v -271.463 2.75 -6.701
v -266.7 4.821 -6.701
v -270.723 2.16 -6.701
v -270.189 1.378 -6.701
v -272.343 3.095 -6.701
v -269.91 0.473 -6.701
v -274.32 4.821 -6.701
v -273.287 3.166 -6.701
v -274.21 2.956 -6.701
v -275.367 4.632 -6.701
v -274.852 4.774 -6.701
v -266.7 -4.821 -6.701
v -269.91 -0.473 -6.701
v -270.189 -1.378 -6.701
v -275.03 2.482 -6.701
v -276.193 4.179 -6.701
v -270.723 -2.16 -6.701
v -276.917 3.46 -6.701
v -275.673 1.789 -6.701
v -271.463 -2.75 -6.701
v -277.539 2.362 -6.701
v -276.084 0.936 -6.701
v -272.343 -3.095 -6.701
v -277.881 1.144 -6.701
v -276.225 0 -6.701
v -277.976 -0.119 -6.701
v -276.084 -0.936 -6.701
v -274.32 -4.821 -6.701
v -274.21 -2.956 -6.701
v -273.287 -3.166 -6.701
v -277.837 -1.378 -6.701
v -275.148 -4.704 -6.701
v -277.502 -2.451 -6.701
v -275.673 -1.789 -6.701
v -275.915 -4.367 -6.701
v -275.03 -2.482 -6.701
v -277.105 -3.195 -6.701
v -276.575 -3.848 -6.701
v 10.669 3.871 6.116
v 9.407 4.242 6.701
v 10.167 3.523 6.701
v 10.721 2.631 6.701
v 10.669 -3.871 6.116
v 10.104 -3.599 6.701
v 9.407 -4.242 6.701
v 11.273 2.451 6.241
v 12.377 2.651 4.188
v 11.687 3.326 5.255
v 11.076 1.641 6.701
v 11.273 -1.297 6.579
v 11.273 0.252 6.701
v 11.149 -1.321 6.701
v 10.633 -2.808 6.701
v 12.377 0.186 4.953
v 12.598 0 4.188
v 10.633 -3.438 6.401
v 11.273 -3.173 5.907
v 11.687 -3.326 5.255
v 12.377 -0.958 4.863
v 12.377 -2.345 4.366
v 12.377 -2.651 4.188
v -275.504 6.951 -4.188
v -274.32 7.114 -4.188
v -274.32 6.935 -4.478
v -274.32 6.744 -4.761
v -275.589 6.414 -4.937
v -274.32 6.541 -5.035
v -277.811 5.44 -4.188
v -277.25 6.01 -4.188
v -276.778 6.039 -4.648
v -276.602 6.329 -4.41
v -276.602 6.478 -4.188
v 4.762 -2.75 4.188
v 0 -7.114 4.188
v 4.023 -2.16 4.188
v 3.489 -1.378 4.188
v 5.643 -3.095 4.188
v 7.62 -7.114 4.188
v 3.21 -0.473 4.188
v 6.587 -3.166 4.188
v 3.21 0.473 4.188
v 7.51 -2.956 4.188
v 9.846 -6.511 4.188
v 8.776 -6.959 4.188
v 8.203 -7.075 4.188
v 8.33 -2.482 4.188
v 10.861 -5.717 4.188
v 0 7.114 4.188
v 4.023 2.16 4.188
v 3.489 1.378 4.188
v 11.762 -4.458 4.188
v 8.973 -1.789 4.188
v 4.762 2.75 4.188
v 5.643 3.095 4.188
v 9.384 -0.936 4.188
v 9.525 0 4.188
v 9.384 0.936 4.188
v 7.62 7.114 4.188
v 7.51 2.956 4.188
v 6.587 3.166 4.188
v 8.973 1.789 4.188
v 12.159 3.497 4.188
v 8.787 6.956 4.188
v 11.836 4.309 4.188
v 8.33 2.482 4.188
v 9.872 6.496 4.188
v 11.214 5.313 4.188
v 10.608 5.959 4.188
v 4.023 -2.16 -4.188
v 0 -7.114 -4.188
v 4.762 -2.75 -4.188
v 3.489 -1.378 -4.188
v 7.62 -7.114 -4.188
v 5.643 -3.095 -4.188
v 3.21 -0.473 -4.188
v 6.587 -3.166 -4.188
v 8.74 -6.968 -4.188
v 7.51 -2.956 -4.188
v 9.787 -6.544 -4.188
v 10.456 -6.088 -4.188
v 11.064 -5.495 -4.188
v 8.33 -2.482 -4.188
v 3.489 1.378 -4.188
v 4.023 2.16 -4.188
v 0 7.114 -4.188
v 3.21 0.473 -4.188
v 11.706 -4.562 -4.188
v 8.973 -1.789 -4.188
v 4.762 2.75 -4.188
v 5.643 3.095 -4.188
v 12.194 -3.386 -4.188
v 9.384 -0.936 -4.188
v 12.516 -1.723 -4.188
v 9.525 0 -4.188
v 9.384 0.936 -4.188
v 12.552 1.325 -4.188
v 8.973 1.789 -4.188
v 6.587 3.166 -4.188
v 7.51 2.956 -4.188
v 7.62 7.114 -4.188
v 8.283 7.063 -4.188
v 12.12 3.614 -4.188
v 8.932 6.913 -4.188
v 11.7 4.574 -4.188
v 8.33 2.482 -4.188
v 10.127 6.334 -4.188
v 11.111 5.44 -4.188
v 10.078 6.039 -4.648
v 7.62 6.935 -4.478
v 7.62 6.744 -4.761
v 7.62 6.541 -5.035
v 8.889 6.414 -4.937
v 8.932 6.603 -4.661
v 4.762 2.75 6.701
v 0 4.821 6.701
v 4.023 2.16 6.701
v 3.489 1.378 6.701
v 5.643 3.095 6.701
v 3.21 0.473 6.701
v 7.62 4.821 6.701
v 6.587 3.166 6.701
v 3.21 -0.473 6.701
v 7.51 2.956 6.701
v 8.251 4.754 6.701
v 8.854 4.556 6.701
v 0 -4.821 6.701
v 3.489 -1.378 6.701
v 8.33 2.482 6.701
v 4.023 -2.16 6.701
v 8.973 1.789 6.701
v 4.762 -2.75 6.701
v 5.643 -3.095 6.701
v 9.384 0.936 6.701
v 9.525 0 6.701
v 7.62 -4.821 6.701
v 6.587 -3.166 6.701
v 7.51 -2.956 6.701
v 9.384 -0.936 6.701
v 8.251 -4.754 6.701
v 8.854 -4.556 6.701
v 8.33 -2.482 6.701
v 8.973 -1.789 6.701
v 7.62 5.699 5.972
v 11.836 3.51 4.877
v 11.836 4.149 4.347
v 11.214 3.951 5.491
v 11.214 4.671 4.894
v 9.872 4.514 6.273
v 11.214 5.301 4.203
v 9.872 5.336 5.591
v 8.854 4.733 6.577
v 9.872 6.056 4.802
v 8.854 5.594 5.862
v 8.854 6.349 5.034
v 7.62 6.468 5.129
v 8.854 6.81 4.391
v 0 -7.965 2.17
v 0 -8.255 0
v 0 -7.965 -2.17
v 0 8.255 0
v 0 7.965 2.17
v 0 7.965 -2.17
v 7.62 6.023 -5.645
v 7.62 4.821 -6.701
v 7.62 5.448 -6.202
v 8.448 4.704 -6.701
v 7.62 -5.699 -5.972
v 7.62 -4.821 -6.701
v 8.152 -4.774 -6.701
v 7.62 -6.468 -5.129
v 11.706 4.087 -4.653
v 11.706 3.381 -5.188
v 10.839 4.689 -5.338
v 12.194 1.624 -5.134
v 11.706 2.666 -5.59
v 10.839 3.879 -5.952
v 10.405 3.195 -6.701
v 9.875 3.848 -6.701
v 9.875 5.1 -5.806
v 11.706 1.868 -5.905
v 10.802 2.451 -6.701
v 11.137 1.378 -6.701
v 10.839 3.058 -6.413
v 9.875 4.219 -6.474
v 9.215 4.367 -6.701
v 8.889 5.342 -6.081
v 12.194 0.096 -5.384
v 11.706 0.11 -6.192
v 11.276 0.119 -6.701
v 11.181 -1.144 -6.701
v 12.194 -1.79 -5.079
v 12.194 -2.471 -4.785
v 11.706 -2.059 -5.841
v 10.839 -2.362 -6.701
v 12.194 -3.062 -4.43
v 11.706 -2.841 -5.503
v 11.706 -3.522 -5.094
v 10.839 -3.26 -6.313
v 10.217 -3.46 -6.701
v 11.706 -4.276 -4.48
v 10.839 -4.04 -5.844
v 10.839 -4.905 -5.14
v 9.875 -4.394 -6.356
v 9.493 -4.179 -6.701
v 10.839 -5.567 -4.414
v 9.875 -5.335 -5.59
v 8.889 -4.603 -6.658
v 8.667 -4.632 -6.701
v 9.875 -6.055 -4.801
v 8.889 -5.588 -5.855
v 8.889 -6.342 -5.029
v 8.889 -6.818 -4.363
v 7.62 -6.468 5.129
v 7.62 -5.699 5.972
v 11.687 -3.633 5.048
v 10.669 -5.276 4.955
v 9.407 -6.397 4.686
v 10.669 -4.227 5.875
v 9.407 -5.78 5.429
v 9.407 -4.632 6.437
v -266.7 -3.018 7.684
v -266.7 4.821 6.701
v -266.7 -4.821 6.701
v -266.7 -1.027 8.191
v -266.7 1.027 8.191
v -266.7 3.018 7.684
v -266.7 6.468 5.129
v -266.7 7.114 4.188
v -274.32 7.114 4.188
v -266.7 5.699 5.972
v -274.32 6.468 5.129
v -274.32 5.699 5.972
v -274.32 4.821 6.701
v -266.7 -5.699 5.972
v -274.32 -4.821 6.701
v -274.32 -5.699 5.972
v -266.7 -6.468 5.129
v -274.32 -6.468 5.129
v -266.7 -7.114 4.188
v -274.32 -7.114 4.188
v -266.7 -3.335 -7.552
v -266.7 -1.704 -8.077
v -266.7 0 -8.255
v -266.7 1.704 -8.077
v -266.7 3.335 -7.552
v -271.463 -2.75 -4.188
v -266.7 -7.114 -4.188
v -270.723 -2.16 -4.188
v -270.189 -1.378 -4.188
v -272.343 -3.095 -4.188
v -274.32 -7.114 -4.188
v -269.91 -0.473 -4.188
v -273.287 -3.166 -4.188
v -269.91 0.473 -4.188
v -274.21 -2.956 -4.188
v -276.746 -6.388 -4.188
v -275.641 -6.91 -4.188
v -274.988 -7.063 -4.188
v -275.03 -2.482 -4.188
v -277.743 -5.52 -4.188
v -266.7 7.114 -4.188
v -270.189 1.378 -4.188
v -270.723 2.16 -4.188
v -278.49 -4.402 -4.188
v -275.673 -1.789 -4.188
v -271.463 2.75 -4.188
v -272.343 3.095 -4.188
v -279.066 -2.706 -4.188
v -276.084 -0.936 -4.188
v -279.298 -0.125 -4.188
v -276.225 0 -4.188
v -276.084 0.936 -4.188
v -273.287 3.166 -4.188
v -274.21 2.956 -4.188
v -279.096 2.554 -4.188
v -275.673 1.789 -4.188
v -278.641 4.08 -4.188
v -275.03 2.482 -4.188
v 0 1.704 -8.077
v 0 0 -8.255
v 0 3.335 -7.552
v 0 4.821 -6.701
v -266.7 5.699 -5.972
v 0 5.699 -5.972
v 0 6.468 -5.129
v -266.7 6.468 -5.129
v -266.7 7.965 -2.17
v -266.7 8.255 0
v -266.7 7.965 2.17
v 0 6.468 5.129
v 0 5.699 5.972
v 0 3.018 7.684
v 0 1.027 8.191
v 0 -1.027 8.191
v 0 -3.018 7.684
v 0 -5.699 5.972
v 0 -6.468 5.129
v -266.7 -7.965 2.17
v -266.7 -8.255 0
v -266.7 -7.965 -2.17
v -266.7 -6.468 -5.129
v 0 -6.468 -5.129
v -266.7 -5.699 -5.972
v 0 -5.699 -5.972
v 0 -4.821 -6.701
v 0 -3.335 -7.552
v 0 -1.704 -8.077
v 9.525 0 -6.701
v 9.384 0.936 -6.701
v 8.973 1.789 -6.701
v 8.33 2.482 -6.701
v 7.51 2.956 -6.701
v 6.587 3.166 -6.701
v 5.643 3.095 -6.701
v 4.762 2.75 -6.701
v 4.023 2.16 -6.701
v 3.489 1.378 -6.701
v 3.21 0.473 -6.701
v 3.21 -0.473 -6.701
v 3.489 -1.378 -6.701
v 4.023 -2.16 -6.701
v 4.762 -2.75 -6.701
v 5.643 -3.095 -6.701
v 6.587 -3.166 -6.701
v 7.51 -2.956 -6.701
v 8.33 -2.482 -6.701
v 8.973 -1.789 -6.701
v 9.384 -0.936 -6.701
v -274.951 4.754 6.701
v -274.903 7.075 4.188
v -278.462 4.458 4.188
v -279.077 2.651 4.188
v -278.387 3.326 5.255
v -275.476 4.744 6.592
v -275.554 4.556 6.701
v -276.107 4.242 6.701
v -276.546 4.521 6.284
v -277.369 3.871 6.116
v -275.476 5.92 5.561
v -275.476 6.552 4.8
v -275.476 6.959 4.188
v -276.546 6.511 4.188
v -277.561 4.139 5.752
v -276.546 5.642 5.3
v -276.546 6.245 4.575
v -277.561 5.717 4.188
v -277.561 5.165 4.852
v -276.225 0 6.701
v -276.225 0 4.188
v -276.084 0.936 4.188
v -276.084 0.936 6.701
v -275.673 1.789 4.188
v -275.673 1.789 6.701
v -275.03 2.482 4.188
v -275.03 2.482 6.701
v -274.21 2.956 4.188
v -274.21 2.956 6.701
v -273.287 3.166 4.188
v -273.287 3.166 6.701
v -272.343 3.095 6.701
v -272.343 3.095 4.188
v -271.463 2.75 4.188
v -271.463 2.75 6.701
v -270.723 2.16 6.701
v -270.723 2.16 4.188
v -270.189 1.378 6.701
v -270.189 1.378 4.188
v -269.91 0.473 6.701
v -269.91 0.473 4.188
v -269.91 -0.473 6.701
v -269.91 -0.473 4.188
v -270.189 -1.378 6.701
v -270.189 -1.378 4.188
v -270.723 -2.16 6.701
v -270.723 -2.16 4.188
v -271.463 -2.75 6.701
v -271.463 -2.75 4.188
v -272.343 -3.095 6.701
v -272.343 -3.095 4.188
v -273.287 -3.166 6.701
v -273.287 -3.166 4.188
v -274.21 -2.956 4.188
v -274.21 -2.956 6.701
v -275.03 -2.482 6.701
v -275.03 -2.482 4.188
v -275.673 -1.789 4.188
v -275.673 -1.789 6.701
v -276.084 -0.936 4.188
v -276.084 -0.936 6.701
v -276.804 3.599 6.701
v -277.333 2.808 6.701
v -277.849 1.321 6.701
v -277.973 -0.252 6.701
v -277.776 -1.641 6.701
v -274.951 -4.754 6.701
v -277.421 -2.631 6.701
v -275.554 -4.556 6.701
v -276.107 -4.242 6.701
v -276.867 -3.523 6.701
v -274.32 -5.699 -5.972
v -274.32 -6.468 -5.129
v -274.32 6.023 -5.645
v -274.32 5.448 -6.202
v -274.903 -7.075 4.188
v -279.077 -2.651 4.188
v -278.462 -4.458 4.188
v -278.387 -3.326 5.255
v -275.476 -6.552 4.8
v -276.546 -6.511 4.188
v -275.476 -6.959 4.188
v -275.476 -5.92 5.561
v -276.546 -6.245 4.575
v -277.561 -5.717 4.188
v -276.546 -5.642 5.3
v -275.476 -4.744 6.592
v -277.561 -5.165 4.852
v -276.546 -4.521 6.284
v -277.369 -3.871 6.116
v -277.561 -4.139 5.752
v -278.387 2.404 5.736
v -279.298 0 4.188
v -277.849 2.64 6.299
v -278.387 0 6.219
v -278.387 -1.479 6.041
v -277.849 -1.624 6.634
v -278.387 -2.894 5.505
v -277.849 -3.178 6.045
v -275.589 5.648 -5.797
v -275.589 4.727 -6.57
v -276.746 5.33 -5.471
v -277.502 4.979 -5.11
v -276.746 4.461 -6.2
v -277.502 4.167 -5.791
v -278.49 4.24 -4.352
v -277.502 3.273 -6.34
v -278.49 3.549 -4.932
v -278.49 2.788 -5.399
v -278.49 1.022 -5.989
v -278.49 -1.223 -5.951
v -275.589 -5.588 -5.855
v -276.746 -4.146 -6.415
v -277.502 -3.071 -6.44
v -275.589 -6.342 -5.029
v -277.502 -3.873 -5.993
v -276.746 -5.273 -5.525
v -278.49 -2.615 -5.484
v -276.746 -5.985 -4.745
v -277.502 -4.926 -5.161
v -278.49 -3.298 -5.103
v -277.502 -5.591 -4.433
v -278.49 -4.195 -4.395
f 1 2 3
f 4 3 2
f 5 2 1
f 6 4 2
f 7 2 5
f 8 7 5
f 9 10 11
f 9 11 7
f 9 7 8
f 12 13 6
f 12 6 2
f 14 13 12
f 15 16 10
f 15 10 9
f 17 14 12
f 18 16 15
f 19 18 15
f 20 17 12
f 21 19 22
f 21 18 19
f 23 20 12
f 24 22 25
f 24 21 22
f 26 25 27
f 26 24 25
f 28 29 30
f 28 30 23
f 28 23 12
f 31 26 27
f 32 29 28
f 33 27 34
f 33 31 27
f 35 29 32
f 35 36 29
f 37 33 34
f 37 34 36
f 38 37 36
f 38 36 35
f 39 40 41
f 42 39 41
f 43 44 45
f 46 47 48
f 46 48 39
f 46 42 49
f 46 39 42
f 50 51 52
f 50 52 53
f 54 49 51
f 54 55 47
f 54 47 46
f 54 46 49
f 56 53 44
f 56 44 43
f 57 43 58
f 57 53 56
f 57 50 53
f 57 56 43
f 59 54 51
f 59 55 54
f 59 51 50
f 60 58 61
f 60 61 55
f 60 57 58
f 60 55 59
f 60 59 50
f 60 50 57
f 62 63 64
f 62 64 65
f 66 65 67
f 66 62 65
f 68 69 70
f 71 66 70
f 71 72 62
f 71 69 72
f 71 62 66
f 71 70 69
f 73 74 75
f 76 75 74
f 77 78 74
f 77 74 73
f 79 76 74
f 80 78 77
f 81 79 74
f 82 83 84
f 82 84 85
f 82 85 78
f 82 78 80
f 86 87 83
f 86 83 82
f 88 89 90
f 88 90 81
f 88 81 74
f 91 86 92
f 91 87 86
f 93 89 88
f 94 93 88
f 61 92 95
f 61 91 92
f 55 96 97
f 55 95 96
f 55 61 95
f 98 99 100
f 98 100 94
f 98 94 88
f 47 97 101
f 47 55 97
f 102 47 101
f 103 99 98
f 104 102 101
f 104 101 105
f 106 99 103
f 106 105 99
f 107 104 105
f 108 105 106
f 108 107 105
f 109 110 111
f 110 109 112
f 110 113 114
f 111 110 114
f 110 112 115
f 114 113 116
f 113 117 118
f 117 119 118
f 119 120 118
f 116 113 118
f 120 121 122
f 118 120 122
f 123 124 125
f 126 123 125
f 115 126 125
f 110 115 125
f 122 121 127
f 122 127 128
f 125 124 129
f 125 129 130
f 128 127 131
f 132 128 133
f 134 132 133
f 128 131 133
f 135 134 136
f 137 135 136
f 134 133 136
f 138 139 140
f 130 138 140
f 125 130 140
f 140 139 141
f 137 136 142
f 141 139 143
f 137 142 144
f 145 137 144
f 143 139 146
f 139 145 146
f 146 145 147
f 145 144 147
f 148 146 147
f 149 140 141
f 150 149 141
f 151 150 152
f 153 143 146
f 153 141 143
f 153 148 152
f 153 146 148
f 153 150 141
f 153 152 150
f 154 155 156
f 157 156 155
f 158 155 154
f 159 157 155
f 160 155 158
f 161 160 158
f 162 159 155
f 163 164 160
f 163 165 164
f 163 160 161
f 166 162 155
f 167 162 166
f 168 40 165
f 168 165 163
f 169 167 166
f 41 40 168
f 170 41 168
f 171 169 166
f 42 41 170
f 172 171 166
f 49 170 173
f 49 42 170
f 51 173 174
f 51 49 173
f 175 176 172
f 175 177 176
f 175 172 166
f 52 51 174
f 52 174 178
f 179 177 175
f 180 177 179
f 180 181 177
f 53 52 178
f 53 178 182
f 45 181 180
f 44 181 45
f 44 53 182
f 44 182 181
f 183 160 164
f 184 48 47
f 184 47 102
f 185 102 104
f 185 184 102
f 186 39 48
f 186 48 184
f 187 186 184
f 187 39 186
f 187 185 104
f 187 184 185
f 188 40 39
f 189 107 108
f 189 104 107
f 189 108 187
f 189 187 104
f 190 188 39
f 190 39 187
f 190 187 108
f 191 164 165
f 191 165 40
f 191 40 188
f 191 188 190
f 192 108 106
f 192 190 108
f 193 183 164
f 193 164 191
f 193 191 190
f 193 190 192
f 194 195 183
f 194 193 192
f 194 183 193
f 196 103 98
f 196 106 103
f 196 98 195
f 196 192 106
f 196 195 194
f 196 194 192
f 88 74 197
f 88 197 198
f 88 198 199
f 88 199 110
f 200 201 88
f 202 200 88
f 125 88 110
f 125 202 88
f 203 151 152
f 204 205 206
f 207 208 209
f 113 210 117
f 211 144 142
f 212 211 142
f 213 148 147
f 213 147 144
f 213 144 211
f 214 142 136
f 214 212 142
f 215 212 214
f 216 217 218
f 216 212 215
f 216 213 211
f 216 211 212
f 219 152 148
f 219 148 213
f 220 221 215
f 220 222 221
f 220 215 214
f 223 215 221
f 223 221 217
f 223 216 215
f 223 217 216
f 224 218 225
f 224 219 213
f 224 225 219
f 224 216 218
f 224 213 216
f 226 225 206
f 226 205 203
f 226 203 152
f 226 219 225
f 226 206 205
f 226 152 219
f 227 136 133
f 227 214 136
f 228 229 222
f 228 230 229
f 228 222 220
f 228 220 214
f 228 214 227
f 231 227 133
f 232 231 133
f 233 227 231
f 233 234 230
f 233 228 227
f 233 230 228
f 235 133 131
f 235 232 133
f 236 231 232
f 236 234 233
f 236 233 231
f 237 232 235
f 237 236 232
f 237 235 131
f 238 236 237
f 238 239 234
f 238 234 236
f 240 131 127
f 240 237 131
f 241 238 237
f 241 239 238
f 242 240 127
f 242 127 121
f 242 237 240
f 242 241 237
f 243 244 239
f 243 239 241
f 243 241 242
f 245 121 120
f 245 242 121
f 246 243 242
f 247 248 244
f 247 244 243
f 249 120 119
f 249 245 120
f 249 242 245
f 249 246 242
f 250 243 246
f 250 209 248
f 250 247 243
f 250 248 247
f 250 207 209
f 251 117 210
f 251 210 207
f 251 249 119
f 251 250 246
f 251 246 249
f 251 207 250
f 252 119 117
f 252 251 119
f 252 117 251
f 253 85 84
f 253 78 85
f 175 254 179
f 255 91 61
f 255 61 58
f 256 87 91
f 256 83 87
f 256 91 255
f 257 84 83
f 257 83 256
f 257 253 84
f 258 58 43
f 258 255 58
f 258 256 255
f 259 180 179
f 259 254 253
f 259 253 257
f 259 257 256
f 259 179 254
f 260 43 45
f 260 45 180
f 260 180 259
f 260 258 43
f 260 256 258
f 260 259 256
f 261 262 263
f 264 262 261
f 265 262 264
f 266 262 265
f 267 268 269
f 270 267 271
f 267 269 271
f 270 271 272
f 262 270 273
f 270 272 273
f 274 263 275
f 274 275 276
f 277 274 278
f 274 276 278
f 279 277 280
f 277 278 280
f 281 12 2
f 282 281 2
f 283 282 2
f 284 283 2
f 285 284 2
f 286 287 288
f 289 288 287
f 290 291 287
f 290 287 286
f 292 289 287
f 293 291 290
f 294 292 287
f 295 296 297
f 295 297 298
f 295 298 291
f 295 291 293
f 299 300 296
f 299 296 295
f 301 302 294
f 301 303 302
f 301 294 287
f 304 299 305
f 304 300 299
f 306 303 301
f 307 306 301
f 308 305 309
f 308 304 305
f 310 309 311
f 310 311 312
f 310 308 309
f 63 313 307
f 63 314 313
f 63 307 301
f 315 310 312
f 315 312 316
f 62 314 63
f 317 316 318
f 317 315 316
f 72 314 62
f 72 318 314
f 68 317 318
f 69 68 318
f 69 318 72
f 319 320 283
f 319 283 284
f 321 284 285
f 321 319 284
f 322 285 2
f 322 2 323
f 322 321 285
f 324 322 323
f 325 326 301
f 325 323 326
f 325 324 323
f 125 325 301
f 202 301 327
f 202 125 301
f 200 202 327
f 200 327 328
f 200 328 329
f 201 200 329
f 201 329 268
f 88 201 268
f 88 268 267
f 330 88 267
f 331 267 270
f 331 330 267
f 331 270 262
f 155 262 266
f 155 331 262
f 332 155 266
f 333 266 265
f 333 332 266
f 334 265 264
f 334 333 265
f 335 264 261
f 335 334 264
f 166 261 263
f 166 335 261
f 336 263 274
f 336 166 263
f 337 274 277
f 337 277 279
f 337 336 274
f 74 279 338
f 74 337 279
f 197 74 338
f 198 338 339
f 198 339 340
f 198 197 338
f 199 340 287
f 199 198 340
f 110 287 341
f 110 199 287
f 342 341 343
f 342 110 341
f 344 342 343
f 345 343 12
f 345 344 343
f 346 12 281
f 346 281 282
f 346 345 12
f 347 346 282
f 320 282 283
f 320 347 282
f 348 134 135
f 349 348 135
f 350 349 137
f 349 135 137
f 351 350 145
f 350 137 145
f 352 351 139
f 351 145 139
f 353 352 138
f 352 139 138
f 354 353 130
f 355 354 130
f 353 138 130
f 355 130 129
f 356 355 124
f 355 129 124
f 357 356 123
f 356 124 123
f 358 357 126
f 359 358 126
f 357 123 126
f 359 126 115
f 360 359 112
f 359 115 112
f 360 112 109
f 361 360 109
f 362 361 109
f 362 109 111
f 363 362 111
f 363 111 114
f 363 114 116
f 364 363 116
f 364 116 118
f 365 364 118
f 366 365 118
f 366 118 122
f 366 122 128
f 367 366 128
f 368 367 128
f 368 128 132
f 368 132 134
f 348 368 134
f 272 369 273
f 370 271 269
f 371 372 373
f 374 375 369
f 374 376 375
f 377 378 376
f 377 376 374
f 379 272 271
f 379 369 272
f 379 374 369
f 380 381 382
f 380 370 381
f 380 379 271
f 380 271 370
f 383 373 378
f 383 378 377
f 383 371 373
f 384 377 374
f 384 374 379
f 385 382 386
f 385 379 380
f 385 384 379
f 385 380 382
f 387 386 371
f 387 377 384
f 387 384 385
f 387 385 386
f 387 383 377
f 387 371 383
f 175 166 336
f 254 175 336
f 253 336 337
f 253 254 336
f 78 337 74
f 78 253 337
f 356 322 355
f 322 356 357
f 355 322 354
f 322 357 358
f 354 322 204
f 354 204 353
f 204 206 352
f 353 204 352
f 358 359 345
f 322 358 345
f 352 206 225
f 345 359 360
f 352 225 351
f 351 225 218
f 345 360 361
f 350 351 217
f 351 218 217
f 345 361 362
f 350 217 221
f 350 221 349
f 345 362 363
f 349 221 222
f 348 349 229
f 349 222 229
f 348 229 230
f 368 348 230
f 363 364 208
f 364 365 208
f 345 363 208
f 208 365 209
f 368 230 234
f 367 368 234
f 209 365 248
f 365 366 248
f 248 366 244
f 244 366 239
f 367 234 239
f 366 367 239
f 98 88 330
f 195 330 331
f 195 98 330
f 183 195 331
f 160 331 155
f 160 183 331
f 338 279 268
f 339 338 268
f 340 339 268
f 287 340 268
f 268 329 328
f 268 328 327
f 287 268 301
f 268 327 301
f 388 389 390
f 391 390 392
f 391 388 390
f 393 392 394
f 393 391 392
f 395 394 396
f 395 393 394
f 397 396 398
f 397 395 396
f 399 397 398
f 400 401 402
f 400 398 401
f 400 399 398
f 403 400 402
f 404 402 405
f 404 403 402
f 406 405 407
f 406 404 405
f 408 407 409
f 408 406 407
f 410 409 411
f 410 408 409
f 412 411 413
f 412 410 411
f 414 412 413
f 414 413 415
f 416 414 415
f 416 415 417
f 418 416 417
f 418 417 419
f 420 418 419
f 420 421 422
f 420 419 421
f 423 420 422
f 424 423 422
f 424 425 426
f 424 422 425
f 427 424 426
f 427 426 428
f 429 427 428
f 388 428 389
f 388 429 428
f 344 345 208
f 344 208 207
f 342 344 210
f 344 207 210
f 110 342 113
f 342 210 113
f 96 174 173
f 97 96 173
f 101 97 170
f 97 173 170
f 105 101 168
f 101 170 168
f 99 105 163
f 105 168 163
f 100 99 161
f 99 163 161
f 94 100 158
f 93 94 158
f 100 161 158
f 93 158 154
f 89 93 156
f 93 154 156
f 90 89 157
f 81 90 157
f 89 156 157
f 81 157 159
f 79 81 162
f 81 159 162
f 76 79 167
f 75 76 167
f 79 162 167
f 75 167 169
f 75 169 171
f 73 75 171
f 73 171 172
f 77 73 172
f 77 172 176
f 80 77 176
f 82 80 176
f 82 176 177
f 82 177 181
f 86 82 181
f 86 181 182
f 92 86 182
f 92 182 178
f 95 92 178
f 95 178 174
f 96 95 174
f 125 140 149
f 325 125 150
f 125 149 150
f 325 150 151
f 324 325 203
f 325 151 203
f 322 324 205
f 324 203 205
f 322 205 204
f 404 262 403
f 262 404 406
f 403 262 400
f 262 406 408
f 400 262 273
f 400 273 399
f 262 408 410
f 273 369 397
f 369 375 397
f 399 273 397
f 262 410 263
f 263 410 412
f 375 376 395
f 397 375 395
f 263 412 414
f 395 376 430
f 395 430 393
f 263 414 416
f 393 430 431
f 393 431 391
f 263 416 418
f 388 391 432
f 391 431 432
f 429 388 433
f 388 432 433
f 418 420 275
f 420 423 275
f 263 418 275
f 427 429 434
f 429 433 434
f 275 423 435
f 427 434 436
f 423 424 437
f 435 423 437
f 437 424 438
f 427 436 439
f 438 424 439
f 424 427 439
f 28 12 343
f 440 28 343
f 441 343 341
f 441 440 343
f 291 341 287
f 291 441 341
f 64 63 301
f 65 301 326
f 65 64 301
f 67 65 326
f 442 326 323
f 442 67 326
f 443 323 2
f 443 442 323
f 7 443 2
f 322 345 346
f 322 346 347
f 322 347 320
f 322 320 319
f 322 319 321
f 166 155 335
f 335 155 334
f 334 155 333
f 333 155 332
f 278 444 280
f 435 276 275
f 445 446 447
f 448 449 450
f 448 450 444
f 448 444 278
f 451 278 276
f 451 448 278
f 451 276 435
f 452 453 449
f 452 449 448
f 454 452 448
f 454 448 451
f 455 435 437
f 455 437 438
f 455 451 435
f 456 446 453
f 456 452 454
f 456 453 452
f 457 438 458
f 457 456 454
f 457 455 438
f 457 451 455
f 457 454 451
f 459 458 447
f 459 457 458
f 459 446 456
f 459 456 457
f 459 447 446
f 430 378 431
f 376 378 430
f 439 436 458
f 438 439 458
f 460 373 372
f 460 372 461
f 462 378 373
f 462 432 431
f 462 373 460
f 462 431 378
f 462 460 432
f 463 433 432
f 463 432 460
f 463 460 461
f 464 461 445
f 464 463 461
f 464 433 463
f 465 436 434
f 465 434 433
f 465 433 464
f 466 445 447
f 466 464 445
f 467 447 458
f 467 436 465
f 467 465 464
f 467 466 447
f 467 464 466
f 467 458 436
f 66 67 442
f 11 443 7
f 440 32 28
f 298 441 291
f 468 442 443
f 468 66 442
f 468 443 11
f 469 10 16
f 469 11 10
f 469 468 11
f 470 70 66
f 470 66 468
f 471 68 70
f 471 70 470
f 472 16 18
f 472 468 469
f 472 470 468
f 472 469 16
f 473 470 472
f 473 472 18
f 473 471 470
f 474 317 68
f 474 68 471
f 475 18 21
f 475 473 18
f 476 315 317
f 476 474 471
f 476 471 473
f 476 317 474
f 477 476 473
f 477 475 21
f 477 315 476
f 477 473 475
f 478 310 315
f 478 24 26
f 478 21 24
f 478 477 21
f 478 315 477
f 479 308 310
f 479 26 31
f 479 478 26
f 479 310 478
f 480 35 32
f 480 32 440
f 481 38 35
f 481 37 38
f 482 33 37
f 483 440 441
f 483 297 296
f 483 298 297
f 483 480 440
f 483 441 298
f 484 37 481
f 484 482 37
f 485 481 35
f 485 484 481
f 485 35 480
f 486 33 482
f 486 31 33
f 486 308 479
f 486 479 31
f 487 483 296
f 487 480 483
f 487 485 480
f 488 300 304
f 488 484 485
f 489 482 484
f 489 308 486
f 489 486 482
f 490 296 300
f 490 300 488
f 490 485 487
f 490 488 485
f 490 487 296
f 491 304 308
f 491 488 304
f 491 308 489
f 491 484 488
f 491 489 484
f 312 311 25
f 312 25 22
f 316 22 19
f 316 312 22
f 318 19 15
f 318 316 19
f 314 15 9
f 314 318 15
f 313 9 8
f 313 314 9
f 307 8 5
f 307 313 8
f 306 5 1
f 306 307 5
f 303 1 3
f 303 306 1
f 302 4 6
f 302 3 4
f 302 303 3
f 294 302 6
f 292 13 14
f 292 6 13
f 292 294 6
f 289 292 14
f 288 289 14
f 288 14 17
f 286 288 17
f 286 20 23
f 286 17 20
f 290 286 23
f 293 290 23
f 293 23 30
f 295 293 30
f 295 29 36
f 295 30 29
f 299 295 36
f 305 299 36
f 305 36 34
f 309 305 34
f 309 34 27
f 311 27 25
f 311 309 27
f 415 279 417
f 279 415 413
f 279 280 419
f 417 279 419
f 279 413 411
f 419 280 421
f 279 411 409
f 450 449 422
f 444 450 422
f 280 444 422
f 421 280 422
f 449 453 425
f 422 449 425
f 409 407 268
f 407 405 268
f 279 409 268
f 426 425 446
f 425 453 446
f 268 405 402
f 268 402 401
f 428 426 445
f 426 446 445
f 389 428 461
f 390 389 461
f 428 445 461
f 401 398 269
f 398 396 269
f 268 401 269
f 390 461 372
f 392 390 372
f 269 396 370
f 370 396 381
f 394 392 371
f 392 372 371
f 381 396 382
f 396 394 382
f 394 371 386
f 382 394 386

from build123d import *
from build123d.topology import SkipClean

# Parameters (mm, degrees)
SKETCH1_R            = 8.255
BOSS_EXTRUDE1_DEPTH  = 266.7
BOSS_EXTRUDE2_START  = 12.7
BOSS_EXTRUDE2_DEPTH  = 12.7
SKETCH5_R            = 3.175
CUT_EXTRUDE1_DEPTH   = 268.246525418
FILLET2_R            = 5.08
FILLET2_OF_MIRROR1_R = 5.08


with BuildPart() as part:
    # Sketch1 → Boss-Extrude1 (new body)
    with BuildSketch(Plane.YZ):
        with Locations(Location((0, 0, 0), (0, 0, 270))):
            Circle(SKETCH1_R)
    boss_extrude1 = extrude(amount=-BOSS_EXTRUDE1_DEPTH)

    # Sketch4 → Boss-Extrude2 (add)
    with SkipClean():  # the faces are left unmerged after this step: merging them gives an invalid solid
        with BuildSketch(Plane.YZ.offset(BOSS_EXTRUDE2_START)):
            with BuildLine():
                Line((-7.113903851, -4.187767543), (7.113903851, -4.187767543))
                ThreePointArc((7.113903851, -4.187767543), (6.098527778, -5.563540594), (4.821496361, -6.700611751))
                Line((4.821496361, -6.700611751), (-4.821496361, -6.700611751))
                ThreePointArc((-4.821496361, -6.700611751), (-6.098527778, -5.563540594), (-7.113903851, -4.187767543))
            make_face()
            with BuildLine():
                Line((-7.113903851, 4.187767543), (7.113903851, 4.187767543))
                ThreePointArc((7.113903851, 4.187767543), (6.098527778, 5.563540594), (4.821496361, 6.700611751))
                Line((4.821496361, 6.700611751), (-4.821496361, 6.700611751))
                ThreePointArc((-4.821496361, 6.700611751), (-6.098527778, 5.563540594), (-7.113903851, 4.187767543))
            make_face()
        boss_extrude2 = extrude(amount=-BOSS_EXTRUDE2_DEPTH)

    # Sketch5 → Cut-Extrude1 (cut, through all)
    with SkipClean():  # the faces are left unmerged after this step: merging them gives an invalid solid
        with BuildSketch(Plane.XY.offset(6.700611751)):
            with Locations((6.35, 0)):
                Circle(SKETCH5_R)
        cut_extrude1 = extrude(amount=-CUT_EXTRUDE1_DEPTH, mode=Mode.SUBTRACT)

    # Fillet2
    # the kernel refuses this fillet: 5.08 mm, written as the material it takes off along each edge
    with BuildSketch(Plane(origin=(12.7, 0, 0), x_dir=(0, 0.7924229506159141, -0.6099720217658908), z_dir=(0, 0.6099720217658908, 0.7924229506159141))) as fillet2_piece_1:
        with BuildLine():
            CenterArc((8.255 - FILLET2_R, FILLET2_R), FILLET2_R, 270, 90)
            Line((8.255 - FILLET2_R, 0), (8.255, 0))
            Line((8.255, 0), (8.255, FILLET2_R))
        make_face()
    revolve(axis=Axis((12.7, 0, 0), (-1, 0, 0)), revolution_arc=200.07814468, mode=Mode.SUBTRACT)
    with BuildSketch(Plane(origin=(12.7, 0, 0), x_dir=(0, 0.534859378845264, 0.8449410895803674), z_dir=(0, -0.8449410895803674, 0.534859378845264))) as fillet2_piece_2:
        with BuildLine():
            CenterArc((8.255 - FILLET2_R, FILLET2_R), FILLET2_R, 270, 90)
            Line((8.255 - FILLET2_R, 0), (8.255, 0))
            Line((8.255, 0), (8.255, FILLET2_R))
        make_face()
    revolve(axis=Axis((12.7, 0, 0), (-1, 0, 0)), revolution_arc=200.07814468, mode=Mode.SUBTRACT)
    with BuildSketch(Plane(origin=(12.7, 0, 0), x_dir=(0, 0.7924229506159125, 0.6099720217658933), z_dir=(0, 0.6099720217658933, -0.7924229506159125))) as fillet2_piece_3:
        with BuildLine():
            CenterArc((8.255 - FILLET2_R, -FILLET2_R), FILLET2_R, 0, 90)
            Line((8.255 - FILLET2_R, 0), (8.255, 0))
            Line((8.255, 0), (8.255, -FILLET2_R))
        make_face()
    revolve(axis=Axis((12.7, 0, 0), (1, 0, 0)), revolution_arc=200.07814468, mode=Mode.SUBTRACT)
    with BuildSketch(Plane(origin=(12.7, 0, 0), x_dir=(0, 0.534859378845264, -0.8449410895803674), z_dir=(0, -0.8449410895803674, -0.534859378845264))) as fillet2_piece_4:
        with BuildLine():
            CenterArc((8.255 - FILLET2_R, -FILLET2_R), FILLET2_R, 0, 90)
            Line((8.255 - FILLET2_R, 0), (8.255, 0))
            Line((8.255, 0), (8.255, -FILLET2_R))
        make_face()
    revolve(axis=Axis((12.7, 0, 0), (1, 0, 0)), revolution_arc=200.07814468, mode=Mode.SUBTRACT)

    # Mirror1: Boss-Extrude1, Boss-Extrude2, Cut-Extrude1 across plane
    add(boss_extrude1.mirror(Plane(origin=(-133.35, 0, 0), x_dir=(0, 0, 1), z_dir=(1, 0, 0))))
    add(boss_extrude2.mirror(Plane(origin=(-133.35, 0, 0), x_dir=(0, 0, 1), z_dir=(1, 0, 0))))
    add(cut_extrude1.mirror(Plane(origin=(-133.35, 0, 0), x_dir=(0, 0, 1), z_dir=(1, 0, 0))), mode=Mode.SUBTRACT)

    # Fillet2 of Mirror1
    # the kernel refuses this fillet: 5.08 mm, written as the material it takes off along each edge
    with BuildSketch(Plane(origin=(-279.4, 0, 0), x_dir=(0, 0.7924229506159141, -0.6099720217658908), z_dir=(0, 0.6099720217658908, 0.7924229506159141))) as fillet2_of_mirror1_piece_1:
        with BuildLine():
            CenterArc((8.255 - FILLET2_OF_MIRROR1_R, -FILLET2_OF_MIRROR1_R), FILLET2_OF_MIRROR1_R, 0, 90)
            Line((8.255 - FILLET2_OF_MIRROR1_R, 0), (8.255, 0))
            Line((8.255, 0), (8.255, -FILLET2_OF_MIRROR1_R))
        make_face()
    revolve(axis=Axis((-279.4, 0, 0), (-1, 0, 0)), revolution_arc=200.07814468, mode=Mode.SUBTRACT)
    with BuildSketch(Plane(origin=(-279.4, 0, 0), x_dir=(0, 0.534859378845264, 0.8449410895803674), z_dir=(0, -0.8449410895803674, 0.534859378845264))) as fillet2_of_mirror1_piece_2:
        with BuildLine():
            CenterArc((8.255 - FILLET2_OF_MIRROR1_R, -FILLET2_OF_MIRROR1_R), FILLET2_OF_MIRROR1_R, 0, 90)
            Line((8.255 - FILLET2_OF_MIRROR1_R, 0), (8.255, 0))
            Line((8.255, 0), (8.255, -FILLET2_OF_MIRROR1_R))
        make_face()
    revolve(axis=Axis((-279.4, 0, 0), (-1, 0, 0)), revolution_arc=200.07814468, mode=Mode.SUBTRACT)
    with BuildSketch(Plane(origin=(-279.4, 0, 0), x_dir=(0, 0.7924229506159125, 0.6099720217658933), z_dir=(0, 0.6099720217658933, -0.7924229506159125))) as fillet2_of_mirror1_piece_3:
        with BuildLine():
            CenterArc((8.255 - FILLET2_OF_MIRROR1_R, FILLET2_OF_MIRROR1_R), FILLET2_OF_MIRROR1_R, 270, 90)
            Line((8.255 - FILLET2_OF_MIRROR1_R, 0), (8.255, 0))
            Line((8.255, 0), (8.255, FILLET2_OF_MIRROR1_R))
        make_face()
    revolve(axis=Axis((-279.4, 0, 0), (1, 0, 0)), revolution_arc=200.07814468, mode=Mode.SUBTRACT)
    with BuildSketch(Plane(origin=(-279.4, 0, 0), x_dir=(0, 0.534859378845264, -0.8449410895803674), z_dir=(0, -0.8449410895803674, -0.534859378845264))) as fillet2_of_mirror1_piece_4:
        with BuildLine():
            CenterArc((8.255 - FILLET2_OF_MIRROR1_R, FILLET2_OF_MIRROR1_R), FILLET2_OF_MIRROR1_R, 270, 90)
            Line((8.255 - FILLET2_OF_MIRROR1_R, 0), (8.255, 0))
            Line((8.255, 0), (8.255, FILLET2_OF_MIRROR1_R))
        make_face()
    revolve(axis=Axis((-279.4, 0, 0), (1, 0, 0)), revolution_arc=200.07814468, mode=Mode.SUBTRACT)


solid = part.part
